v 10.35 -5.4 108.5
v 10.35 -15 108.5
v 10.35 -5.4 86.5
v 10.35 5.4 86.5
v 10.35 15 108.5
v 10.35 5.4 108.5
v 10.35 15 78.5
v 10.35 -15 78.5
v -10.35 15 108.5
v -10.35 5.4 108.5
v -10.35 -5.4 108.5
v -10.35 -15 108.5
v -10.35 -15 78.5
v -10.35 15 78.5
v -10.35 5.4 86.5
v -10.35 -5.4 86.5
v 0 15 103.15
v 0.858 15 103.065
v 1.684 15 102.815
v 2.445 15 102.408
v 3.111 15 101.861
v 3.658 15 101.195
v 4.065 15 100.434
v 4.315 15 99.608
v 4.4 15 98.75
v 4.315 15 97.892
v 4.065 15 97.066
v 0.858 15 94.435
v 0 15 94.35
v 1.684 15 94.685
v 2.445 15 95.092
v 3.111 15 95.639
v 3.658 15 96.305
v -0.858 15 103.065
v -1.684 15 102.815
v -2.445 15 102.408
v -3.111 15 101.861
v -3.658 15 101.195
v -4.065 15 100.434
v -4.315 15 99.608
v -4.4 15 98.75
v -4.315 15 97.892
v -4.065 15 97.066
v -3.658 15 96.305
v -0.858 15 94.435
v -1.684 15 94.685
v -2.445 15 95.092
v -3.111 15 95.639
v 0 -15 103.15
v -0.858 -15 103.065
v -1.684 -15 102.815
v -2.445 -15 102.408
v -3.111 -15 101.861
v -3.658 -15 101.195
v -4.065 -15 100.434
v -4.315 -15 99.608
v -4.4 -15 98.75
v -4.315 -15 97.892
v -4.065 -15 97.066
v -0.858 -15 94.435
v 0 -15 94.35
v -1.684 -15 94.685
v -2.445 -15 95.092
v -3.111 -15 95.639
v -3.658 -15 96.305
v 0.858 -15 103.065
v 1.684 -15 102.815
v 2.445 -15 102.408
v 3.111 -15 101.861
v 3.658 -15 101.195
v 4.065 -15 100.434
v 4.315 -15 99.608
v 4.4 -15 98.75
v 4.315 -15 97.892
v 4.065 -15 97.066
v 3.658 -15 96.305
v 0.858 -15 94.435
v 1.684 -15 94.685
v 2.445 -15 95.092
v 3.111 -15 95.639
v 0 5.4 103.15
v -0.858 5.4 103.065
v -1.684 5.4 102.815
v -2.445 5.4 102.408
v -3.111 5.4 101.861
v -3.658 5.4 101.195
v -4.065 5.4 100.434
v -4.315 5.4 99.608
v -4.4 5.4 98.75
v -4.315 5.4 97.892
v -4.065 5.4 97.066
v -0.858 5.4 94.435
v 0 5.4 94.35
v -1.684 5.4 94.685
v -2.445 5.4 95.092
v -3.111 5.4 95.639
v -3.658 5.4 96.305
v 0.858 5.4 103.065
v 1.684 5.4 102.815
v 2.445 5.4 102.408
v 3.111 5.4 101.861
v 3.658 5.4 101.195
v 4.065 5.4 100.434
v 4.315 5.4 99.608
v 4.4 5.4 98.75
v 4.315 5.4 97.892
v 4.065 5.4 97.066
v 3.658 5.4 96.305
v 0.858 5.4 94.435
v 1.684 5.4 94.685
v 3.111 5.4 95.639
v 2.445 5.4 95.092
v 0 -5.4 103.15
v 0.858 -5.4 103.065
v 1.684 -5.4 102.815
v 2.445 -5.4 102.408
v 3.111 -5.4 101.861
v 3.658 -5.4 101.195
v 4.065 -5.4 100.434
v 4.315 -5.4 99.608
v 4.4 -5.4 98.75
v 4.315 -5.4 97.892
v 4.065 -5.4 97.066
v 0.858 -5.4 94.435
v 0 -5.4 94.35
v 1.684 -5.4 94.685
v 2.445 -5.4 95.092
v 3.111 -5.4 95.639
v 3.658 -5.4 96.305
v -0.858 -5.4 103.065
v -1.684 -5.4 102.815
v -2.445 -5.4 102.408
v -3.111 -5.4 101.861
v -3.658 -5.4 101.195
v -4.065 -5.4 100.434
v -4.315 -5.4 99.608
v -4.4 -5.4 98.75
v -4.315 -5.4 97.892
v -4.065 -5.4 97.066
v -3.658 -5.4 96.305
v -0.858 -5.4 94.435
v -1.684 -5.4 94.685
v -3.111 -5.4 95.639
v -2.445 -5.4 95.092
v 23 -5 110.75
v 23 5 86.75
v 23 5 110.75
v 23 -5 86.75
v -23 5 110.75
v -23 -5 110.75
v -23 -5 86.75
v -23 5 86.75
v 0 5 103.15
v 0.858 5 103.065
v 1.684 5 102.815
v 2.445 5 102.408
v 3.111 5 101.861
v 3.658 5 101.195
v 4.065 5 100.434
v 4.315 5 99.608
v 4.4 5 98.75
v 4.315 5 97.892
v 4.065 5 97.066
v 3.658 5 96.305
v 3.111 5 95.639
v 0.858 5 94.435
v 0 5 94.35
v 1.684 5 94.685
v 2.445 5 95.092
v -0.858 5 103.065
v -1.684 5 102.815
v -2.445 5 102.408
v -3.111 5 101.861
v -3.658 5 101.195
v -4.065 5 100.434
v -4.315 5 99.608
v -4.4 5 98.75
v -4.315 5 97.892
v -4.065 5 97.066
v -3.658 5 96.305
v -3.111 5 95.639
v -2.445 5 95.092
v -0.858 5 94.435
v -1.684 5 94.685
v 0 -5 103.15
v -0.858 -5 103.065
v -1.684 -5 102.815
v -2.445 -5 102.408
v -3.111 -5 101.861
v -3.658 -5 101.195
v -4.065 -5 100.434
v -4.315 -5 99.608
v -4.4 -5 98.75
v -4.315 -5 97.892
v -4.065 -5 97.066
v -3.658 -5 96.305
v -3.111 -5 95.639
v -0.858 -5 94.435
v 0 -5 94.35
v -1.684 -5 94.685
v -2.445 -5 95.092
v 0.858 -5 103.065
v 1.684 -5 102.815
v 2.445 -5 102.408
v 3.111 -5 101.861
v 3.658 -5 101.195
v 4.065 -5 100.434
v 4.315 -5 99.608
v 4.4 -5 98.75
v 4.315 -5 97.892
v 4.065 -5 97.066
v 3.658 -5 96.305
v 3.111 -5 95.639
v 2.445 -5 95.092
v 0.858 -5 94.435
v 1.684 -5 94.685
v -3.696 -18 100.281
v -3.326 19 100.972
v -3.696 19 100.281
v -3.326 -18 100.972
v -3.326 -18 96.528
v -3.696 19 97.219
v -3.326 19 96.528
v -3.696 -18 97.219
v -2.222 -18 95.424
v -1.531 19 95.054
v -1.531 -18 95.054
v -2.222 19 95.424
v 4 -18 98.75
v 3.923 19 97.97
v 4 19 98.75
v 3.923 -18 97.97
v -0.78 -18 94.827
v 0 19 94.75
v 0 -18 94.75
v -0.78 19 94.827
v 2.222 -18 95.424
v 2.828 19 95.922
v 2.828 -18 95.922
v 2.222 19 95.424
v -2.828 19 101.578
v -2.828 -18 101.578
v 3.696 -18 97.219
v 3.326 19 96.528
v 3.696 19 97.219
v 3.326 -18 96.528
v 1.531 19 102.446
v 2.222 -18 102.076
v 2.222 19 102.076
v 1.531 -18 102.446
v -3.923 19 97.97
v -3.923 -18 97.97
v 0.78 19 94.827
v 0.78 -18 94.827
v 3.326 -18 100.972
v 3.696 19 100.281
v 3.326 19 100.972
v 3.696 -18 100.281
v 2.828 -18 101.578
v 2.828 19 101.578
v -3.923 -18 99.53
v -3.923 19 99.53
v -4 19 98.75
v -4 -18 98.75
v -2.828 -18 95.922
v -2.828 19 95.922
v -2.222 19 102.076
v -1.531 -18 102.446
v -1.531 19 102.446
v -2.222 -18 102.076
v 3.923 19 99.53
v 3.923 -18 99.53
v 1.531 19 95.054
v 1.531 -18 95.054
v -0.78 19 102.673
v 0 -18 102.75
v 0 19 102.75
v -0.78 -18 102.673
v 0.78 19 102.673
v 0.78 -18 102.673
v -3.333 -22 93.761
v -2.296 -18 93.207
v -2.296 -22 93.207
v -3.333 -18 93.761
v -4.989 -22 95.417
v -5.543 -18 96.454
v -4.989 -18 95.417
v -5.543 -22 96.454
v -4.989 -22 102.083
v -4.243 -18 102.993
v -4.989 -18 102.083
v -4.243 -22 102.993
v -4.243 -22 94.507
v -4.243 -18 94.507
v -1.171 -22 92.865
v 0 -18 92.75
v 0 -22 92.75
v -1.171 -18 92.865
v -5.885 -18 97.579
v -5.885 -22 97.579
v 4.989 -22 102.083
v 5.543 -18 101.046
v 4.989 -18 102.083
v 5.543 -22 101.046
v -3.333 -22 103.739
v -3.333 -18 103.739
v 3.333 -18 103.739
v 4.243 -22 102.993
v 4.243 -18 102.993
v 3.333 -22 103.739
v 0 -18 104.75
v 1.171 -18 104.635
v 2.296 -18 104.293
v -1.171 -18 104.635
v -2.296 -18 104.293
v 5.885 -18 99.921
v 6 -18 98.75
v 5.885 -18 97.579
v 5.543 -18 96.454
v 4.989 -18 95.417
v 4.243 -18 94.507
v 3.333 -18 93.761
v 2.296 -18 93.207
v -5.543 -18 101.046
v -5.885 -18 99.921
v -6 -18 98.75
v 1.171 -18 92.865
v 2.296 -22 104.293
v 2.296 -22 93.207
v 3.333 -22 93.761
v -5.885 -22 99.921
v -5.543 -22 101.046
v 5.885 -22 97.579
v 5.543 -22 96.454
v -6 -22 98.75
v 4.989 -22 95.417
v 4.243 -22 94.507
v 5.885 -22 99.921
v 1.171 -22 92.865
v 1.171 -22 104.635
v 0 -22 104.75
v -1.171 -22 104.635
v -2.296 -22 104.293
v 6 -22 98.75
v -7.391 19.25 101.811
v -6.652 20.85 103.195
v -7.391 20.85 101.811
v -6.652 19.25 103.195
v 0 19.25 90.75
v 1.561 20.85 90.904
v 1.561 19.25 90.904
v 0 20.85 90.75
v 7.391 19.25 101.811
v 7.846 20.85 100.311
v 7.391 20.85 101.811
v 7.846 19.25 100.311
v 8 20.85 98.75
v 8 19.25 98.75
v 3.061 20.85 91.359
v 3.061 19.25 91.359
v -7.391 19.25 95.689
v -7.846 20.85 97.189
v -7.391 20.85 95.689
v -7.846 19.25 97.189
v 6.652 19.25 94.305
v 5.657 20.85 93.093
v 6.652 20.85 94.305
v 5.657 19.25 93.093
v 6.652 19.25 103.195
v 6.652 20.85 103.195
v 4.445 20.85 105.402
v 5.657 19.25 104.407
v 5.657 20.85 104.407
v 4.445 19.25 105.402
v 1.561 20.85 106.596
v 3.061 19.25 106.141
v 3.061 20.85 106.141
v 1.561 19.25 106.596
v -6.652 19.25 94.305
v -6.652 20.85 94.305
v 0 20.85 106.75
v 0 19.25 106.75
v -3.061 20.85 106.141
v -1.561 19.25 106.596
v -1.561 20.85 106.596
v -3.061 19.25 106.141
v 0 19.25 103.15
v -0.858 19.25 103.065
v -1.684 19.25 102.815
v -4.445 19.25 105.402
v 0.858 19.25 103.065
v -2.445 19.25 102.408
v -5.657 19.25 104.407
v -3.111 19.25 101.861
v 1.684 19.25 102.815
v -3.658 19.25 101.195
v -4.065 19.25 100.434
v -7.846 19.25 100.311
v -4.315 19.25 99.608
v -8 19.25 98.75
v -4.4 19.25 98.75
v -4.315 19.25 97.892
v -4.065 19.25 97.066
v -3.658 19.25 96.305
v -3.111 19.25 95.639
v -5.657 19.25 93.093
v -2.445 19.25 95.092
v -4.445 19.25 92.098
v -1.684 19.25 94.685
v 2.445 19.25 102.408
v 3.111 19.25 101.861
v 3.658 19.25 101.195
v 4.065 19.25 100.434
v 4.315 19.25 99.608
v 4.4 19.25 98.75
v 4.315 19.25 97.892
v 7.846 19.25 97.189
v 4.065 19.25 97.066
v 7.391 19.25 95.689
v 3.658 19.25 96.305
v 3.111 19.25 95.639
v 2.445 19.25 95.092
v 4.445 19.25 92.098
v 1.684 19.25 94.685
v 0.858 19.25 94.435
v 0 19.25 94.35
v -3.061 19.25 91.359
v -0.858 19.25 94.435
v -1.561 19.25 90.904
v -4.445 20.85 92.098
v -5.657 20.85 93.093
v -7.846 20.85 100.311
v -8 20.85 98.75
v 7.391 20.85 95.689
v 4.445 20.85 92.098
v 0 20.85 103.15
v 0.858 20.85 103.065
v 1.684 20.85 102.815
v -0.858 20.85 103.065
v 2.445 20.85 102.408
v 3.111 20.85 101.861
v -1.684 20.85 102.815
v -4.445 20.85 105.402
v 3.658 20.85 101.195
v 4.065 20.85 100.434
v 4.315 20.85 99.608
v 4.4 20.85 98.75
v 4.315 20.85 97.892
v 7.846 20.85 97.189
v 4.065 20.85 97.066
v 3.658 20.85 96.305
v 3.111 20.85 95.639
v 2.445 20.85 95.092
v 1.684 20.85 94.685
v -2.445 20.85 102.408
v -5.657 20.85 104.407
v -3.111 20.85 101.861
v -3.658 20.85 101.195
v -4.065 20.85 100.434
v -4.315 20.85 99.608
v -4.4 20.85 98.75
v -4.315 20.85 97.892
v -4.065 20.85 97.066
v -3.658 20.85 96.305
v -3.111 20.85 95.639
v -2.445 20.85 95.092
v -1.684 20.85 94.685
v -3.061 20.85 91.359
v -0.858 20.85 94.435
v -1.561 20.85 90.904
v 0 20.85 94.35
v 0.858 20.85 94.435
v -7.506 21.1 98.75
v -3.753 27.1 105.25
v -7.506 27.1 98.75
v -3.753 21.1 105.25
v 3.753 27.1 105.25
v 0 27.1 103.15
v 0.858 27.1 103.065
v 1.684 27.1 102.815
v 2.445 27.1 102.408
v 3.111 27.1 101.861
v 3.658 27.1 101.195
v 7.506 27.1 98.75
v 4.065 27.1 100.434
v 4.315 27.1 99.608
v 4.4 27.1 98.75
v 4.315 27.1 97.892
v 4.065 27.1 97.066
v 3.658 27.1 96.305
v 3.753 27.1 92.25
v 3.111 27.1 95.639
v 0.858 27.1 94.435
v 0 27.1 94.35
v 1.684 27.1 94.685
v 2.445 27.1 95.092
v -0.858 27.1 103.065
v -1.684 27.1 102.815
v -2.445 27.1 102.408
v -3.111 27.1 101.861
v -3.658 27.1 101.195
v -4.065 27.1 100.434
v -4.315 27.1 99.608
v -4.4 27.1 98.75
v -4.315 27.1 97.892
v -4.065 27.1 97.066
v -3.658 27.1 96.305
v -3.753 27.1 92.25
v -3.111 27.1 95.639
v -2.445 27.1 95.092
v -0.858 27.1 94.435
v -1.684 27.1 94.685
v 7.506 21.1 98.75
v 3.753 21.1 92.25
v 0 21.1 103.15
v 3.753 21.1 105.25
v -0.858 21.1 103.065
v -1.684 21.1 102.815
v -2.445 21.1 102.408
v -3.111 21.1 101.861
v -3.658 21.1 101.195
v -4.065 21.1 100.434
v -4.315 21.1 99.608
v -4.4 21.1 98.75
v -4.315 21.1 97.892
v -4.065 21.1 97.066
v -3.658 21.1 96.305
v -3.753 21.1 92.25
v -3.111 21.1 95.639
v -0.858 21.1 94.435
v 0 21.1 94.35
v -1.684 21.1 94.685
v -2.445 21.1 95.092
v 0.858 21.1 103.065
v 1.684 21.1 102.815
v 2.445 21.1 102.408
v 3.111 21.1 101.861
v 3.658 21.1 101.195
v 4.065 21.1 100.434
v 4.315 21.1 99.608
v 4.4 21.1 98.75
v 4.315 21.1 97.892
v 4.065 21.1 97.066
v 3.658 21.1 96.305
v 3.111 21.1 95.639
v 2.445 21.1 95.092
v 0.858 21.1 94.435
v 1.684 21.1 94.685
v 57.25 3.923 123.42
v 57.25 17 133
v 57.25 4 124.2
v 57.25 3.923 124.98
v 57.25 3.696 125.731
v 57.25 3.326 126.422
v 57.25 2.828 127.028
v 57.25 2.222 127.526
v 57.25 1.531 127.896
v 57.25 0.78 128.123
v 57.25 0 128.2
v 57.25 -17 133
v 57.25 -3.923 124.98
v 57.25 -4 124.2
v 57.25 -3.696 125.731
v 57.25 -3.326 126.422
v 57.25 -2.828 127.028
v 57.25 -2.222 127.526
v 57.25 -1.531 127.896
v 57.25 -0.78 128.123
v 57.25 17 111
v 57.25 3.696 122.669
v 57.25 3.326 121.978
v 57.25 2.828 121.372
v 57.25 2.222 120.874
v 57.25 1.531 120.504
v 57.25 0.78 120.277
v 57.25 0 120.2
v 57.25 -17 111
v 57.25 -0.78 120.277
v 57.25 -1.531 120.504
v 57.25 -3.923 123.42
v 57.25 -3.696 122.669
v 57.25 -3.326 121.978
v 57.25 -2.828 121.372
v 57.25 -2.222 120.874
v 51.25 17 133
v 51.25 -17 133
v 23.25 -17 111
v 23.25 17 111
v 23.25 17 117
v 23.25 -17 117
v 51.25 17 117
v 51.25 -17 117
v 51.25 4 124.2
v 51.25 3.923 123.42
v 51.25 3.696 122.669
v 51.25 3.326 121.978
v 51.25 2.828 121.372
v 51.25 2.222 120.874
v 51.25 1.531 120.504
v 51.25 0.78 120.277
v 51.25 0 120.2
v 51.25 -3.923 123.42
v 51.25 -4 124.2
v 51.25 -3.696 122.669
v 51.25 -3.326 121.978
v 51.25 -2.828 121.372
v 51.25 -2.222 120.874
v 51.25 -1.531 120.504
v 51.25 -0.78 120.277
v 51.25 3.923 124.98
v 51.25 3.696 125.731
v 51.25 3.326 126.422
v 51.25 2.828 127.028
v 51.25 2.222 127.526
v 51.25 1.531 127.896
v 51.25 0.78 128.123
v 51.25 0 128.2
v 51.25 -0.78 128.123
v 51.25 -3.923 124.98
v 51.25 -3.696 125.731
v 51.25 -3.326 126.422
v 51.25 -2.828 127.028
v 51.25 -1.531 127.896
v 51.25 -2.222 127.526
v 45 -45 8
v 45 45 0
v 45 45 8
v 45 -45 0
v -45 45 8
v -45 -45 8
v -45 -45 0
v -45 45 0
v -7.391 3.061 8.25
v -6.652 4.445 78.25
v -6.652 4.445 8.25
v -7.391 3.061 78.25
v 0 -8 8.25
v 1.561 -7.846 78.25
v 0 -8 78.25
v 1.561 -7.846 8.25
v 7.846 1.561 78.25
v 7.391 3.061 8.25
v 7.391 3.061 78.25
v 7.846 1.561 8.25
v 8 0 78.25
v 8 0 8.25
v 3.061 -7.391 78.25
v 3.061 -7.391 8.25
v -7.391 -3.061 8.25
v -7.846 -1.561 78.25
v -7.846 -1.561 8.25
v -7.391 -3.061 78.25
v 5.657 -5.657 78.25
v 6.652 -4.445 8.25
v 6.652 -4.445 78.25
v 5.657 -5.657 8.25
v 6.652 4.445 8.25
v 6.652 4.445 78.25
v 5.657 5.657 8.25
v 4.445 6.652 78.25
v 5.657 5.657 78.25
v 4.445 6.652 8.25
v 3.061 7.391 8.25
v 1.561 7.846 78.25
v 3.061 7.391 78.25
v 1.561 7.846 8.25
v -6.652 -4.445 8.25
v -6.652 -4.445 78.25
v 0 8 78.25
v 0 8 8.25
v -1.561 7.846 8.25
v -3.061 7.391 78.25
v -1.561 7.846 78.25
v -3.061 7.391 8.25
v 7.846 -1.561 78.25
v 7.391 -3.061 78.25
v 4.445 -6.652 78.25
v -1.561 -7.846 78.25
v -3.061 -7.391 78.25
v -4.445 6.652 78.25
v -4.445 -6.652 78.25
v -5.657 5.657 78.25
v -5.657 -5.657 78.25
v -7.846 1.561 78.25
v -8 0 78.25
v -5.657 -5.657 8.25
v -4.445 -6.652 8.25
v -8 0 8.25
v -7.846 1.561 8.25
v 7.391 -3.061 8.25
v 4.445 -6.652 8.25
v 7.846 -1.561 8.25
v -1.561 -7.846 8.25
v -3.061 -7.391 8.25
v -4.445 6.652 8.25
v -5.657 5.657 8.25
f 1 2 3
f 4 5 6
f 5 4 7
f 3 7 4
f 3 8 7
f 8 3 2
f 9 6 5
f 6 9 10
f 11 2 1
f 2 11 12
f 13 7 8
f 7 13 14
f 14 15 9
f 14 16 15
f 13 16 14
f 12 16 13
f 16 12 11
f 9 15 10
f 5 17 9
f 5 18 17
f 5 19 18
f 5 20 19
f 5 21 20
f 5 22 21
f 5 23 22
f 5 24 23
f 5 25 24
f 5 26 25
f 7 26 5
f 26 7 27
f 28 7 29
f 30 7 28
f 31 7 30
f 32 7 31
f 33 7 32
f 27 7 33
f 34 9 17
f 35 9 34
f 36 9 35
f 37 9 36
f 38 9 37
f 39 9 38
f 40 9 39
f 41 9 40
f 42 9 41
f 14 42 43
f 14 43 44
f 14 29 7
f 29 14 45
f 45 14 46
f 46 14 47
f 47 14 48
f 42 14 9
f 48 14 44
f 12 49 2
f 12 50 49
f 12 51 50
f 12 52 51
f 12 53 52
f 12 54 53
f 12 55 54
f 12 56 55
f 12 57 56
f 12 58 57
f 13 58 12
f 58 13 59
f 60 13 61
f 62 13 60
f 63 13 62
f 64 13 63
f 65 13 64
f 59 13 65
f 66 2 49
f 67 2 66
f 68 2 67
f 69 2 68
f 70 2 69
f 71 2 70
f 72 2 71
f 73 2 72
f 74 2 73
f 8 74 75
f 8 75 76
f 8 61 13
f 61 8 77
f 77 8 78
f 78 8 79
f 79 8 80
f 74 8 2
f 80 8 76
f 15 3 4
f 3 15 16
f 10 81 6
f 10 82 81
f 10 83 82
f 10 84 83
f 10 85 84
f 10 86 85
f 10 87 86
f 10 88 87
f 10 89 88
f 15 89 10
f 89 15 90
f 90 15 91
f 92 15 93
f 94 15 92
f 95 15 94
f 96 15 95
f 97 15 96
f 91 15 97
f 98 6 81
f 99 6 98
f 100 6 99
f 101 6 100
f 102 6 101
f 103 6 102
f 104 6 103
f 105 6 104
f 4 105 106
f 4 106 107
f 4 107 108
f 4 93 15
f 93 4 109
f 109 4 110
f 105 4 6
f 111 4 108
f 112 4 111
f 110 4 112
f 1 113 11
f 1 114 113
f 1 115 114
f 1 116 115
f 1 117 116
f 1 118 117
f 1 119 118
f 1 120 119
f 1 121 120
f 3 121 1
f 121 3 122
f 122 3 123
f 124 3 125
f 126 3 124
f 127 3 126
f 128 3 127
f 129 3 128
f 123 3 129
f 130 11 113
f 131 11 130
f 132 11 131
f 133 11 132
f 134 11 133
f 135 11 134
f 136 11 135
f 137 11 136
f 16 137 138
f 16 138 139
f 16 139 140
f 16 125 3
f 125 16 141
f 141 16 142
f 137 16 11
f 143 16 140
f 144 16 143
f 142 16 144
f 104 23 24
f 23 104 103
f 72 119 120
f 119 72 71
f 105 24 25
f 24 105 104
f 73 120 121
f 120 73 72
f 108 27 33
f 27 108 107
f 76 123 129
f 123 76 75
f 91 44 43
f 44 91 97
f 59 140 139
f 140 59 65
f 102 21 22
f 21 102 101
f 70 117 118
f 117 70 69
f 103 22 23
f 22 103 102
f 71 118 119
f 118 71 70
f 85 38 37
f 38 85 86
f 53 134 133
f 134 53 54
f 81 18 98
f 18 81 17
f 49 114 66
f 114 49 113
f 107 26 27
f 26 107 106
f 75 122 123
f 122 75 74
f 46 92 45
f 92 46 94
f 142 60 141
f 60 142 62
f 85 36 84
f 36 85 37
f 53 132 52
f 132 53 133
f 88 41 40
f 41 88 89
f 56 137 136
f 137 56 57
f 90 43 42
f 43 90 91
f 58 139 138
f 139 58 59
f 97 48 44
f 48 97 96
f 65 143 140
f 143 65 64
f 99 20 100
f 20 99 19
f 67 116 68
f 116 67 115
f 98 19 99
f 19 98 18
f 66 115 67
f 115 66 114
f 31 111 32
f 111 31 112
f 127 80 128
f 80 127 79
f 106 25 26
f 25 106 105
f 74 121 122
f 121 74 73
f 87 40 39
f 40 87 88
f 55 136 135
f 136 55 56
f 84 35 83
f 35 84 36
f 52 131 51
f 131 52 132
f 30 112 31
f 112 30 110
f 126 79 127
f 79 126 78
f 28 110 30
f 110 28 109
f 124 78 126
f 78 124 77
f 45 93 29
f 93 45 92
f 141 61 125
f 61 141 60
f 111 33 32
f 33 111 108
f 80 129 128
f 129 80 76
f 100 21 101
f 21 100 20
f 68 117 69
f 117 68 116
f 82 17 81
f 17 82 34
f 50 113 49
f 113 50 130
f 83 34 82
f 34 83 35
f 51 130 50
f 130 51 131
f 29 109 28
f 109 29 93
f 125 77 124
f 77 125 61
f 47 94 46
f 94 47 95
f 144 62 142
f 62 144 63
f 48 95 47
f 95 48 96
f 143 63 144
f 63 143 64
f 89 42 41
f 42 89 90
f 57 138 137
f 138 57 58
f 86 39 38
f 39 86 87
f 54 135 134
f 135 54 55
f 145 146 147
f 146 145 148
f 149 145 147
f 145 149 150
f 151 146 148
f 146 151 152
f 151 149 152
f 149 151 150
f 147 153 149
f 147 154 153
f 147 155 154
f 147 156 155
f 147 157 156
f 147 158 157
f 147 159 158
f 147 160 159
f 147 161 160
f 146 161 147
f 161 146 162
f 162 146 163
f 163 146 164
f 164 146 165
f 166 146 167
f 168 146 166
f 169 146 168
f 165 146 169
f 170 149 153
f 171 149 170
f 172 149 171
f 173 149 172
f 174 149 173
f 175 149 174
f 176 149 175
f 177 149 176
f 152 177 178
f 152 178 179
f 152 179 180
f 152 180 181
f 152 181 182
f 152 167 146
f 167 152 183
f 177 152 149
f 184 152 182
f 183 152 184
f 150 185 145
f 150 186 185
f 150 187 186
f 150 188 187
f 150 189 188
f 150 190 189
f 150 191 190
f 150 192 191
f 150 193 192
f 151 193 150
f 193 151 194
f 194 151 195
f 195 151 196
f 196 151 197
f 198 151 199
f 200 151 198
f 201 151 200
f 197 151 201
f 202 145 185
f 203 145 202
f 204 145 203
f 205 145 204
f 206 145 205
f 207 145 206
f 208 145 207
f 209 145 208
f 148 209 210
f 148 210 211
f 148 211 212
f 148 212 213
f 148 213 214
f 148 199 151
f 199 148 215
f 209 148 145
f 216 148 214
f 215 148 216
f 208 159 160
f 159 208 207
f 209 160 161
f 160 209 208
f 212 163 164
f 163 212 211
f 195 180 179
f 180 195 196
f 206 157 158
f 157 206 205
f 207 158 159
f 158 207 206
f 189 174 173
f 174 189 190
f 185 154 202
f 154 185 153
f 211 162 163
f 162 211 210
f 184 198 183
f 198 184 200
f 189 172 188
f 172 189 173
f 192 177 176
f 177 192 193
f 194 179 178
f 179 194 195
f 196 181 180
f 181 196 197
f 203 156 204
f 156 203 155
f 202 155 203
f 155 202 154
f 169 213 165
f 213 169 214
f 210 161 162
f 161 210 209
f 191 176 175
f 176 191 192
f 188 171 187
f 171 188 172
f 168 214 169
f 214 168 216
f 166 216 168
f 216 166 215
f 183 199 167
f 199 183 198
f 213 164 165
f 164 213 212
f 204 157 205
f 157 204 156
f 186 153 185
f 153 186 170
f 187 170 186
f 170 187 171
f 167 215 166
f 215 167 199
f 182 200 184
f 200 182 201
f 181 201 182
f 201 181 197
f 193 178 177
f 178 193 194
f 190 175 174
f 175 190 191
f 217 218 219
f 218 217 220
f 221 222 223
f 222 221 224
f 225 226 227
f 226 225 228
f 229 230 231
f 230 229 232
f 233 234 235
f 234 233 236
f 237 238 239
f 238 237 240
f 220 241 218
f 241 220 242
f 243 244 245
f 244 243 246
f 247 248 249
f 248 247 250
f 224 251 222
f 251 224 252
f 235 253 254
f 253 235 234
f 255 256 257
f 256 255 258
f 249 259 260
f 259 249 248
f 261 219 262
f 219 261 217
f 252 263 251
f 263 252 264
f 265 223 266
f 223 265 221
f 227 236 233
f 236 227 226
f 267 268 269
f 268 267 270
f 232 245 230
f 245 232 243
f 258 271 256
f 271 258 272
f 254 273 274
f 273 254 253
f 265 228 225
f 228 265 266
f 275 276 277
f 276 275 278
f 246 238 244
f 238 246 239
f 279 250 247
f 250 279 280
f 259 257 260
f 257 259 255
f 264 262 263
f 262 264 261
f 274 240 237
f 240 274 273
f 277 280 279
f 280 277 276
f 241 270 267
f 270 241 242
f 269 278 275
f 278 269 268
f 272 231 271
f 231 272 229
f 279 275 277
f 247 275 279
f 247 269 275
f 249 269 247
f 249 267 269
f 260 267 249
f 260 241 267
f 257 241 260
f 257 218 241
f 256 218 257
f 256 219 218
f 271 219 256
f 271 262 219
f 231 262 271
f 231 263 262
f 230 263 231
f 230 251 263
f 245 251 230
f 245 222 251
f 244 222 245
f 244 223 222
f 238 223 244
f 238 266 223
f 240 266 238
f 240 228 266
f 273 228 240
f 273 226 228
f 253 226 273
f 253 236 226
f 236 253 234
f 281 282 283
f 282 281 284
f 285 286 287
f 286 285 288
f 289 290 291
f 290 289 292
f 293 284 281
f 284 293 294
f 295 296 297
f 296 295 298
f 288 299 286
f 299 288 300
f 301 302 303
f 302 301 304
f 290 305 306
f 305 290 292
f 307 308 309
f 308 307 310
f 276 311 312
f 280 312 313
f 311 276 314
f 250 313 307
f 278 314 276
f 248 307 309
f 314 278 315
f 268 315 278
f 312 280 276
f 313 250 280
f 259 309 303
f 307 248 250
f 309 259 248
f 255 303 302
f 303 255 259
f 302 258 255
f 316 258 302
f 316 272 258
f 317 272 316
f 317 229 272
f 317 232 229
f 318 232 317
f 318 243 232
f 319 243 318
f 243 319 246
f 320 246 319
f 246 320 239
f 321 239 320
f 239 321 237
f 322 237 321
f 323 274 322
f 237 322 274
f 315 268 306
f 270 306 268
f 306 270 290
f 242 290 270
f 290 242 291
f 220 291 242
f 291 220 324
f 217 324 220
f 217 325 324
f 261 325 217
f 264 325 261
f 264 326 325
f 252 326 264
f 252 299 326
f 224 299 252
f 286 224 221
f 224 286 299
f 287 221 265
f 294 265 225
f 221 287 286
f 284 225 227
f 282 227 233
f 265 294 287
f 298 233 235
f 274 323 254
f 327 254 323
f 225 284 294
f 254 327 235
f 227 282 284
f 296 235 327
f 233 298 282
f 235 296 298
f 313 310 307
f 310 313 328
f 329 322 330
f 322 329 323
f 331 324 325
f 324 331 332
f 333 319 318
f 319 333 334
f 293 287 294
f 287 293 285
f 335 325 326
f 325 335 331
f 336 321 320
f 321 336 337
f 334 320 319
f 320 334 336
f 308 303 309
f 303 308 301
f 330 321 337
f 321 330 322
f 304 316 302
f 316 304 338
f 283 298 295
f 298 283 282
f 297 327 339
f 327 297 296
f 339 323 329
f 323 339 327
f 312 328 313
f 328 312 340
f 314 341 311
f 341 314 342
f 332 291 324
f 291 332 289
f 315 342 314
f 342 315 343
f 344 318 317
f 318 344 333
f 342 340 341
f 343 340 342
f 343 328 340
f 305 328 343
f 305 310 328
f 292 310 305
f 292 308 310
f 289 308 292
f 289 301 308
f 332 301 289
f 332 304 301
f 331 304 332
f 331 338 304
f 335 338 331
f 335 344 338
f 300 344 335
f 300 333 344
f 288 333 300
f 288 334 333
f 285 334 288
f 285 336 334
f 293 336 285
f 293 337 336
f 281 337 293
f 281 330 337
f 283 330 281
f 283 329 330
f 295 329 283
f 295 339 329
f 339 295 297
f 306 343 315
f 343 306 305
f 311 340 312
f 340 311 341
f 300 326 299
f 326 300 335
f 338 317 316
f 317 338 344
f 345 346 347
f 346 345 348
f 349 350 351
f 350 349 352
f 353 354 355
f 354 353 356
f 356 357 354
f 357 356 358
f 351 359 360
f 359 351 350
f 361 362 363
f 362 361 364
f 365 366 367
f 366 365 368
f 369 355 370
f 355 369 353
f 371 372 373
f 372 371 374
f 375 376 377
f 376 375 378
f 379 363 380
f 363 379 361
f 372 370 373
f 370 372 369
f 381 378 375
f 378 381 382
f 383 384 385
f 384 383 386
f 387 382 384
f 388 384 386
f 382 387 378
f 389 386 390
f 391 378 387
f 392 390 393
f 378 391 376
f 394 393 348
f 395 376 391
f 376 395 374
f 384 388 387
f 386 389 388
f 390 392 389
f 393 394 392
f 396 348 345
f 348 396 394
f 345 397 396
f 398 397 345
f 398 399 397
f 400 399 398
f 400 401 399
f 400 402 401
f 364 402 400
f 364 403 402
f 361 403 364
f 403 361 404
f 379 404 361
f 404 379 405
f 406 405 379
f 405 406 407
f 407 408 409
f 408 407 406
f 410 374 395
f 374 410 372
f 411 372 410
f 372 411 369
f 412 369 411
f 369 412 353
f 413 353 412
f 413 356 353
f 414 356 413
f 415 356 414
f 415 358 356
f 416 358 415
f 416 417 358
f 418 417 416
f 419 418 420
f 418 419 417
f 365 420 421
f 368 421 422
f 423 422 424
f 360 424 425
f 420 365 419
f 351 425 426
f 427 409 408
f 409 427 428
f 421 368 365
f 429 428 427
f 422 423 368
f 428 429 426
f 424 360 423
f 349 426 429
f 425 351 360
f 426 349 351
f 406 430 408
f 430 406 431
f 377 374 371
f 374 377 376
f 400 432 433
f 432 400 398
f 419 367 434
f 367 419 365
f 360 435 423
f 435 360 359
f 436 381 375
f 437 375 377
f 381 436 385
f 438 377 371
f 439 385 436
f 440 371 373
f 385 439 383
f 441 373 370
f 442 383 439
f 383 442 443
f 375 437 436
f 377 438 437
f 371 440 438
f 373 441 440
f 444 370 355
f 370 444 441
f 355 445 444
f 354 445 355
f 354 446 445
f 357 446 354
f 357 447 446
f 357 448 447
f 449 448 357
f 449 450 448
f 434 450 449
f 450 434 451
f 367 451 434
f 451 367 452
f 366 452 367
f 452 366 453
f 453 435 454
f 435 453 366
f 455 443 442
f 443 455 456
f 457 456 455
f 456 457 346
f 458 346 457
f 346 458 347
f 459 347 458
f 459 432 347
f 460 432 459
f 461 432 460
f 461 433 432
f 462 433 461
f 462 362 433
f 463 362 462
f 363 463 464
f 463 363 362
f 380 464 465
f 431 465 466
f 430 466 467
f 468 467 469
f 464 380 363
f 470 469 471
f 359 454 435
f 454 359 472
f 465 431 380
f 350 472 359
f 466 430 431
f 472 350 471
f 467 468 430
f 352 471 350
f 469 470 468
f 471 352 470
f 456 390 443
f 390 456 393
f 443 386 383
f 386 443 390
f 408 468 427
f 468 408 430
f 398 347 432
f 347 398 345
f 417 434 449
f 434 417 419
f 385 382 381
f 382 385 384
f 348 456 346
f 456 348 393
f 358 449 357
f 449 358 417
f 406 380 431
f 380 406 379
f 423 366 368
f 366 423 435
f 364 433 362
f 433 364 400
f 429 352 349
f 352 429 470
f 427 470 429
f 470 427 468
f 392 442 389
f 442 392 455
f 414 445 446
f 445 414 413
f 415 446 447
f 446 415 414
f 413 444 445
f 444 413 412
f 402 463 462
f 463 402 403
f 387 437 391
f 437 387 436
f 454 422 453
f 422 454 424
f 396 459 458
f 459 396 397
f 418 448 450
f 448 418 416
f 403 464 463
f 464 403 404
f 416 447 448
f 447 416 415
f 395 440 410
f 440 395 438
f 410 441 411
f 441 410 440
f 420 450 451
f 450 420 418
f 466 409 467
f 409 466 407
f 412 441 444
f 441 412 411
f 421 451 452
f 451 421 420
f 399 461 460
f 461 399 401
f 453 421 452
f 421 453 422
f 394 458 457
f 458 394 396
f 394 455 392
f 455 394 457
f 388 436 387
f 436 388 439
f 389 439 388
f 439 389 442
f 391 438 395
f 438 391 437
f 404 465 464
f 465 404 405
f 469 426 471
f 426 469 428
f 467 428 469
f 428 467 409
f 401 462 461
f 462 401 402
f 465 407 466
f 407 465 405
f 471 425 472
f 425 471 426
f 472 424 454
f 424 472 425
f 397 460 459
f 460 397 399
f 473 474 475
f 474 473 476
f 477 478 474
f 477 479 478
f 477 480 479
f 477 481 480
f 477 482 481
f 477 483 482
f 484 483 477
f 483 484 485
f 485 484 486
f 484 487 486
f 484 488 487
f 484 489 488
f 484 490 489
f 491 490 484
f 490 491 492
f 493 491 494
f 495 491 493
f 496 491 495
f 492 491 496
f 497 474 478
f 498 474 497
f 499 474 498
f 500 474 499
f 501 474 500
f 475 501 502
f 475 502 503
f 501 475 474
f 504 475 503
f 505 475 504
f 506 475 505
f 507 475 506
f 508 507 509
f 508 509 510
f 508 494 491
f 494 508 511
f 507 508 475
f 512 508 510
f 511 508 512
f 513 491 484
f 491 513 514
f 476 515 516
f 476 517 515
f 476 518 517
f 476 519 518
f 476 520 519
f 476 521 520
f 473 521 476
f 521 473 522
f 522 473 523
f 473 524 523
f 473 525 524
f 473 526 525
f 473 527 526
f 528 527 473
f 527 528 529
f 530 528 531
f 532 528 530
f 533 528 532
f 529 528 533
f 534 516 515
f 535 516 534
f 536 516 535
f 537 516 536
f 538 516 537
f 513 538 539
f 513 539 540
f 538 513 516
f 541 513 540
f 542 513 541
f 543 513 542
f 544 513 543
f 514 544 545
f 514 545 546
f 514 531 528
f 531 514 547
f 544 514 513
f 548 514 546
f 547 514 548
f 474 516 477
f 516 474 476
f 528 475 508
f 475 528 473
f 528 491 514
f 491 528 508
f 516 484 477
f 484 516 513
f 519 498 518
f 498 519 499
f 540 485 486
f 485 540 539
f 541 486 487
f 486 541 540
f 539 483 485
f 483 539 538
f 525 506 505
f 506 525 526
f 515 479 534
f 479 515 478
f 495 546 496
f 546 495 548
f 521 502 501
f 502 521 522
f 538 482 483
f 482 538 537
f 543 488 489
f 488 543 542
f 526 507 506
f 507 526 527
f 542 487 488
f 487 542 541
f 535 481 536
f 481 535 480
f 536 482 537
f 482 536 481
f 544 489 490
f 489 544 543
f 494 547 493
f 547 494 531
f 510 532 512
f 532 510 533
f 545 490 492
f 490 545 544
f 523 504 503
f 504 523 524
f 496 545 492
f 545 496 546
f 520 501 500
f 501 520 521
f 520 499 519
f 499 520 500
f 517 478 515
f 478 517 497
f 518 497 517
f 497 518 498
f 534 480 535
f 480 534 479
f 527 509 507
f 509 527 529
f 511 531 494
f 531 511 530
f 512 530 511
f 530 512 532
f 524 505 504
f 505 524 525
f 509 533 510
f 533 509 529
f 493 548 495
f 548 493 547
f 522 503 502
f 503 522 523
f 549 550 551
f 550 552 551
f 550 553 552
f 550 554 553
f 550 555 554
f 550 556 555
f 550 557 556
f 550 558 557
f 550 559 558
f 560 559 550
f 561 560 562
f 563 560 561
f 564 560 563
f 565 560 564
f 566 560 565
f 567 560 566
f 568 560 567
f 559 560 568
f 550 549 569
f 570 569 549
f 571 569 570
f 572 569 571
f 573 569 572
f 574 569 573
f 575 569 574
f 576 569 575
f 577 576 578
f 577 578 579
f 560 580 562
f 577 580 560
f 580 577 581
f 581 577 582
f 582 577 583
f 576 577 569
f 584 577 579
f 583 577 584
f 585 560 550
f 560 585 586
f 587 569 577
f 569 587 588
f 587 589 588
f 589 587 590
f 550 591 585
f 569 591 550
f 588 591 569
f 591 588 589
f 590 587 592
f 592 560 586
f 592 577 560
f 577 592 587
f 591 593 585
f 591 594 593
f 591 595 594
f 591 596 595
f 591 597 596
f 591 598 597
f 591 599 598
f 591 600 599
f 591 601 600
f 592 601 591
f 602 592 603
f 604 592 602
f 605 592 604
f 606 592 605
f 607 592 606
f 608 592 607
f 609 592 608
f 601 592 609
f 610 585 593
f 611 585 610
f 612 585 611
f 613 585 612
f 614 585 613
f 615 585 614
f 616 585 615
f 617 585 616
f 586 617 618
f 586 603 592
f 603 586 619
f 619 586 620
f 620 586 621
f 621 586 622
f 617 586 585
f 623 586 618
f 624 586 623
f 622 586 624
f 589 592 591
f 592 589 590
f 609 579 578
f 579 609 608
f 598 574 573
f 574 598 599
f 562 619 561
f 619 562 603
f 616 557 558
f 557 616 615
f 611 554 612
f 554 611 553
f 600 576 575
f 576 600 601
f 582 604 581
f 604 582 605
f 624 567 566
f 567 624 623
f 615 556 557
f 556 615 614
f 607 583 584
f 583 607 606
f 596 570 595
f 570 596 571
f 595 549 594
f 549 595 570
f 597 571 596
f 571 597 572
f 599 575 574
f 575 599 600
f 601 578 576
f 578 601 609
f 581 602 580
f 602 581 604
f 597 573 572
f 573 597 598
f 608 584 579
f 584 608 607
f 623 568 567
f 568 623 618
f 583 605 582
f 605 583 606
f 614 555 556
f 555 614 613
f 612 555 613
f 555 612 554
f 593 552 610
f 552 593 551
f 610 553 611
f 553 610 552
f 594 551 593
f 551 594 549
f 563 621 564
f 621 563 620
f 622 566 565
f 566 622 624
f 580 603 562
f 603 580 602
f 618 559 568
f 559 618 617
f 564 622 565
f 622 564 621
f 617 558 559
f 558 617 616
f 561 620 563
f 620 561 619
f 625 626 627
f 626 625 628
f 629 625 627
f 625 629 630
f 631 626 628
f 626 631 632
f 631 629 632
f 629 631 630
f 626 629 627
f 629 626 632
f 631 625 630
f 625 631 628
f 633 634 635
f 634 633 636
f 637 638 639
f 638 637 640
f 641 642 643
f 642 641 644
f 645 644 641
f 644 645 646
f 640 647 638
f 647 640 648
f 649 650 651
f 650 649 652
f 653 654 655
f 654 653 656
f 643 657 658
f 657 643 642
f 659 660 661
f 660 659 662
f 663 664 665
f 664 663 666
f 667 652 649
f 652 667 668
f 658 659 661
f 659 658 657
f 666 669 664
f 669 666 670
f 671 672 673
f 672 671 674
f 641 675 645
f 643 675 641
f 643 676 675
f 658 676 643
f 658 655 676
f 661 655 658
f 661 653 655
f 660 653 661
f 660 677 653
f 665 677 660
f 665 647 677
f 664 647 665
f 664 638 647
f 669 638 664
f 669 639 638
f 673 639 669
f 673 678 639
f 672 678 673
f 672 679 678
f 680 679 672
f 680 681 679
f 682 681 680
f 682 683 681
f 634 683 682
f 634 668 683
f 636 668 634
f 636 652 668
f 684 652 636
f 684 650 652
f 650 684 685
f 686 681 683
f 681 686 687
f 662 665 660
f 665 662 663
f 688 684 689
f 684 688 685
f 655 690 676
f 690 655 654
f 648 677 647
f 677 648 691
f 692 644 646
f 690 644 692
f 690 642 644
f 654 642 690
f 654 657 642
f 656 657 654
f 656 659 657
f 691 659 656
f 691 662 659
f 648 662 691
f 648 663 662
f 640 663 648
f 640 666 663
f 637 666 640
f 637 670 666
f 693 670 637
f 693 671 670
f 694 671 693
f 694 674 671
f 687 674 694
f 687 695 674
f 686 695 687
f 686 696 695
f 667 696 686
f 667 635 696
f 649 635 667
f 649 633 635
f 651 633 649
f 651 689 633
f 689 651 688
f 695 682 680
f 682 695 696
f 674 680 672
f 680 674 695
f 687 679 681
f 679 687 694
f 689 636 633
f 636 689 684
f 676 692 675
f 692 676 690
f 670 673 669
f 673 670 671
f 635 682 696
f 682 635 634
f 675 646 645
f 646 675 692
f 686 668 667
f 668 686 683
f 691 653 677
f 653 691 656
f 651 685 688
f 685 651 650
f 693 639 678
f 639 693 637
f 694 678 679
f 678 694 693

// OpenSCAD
$fn = 32;

// ------------------------------------------------------------------------
// Lamp arm: column d16 x 70 mm, arm 46 mm
// Every part is its own module, assembly() places every instance.
// ------------------------------------------------------------------------

// --- part 1 ---
module lamp_base() {
  difference() {
    translate([-45, -45, 0]) cube([90, 90, 8]);
  }
}

// --- part 2 ---
module lamp_column() {
  cylinder(h = 70, d = 16);
}

// --- part 3 ---
module head_fork() {
  difference() {
    translate([-10.35, -15, 0]) cube([20.7, 30, 30]);
    translate([-11.35, -5.4, 8]) cube([22.7, 10.8, 23]);
    translate([0, 0, 20.25]) rotate([90, 0, 0]) cylinder(h = 32, d = 8.8, center = true);
  }
}

// --- part 4 ---
module lamp_arm() {
  difference() {
    translate([-23, -5, 0]) cube([46, 10, 24]);
    translate([0, 0, 12]) rotate([90, 0, 0]) cylinder(h = 12, d = 8.8, center = true);
  }
}

// --- part 5 ---
module arm_pin() {
  rotate([0, 90, 0]) cylinder(h = 38, d = 8, center = true);
  translate([-22, 0, 0]) rotate([0, 90, 0]) cylinder(h = 4, d = 12);
}

// --- part 6 ---
module arm_washer() {
  difference() {
      translate([0, 0, 0]) cylinder(h = 1.6, d = 16);
      translate([0, 0, -1]) cylinder(h = 3.6, d = 8.8);
    }
}

// --- part 7 ---
module arm_nut() {
  difference() {
    linear_extrude(height = 6) polygon(points = [[7.506, 0], [3.753, 6.5], [-3.753, 6.5], [-7.506, 0], [-3.753, -6.5], [3.753, -6.5]]);
    translate([0, 0, -1]) cylinder(h = 8, d = 8.8);
  }
}

// --- part 8 ---
module shade_bracket() {
  difference() {
    translate([-17, -17, 0]) cube([34, 34, 22]);
    translate([-18, -18, 6]) cube([29, 36, 17]);
    translate([14, 0, 13.2]) rotate([0, 90, 0]) cylinder(h = 8, d = 8, center = true);
  }
}

// --- assembly ---
module assembly() {
  color([0.80, 0.24, 0.20]) translate([0, 0, 0]) rotate([0, 0, 0]) lamp_base();
  color([0.20, 0.45, 0.75]) translate([0, 0, 8.25]) rotate([0, 0, 0]) lamp_column();
  color([0.25, 0.62, 0.32]) translate([0, 0, 78.5]) rotate([0, 0, 0]) head_fork();
  color([0.92, 0.70, 0.18]) translate([0, 0, 86.75]) rotate([0, 0, 0]) lamp_arm();
  color([0.58, 0.35, 0.70]) translate([0, 0, 98.75]) rotate([0, 0, 90]) arm_pin();
  color([0.16, 0.66, 0.66]) translate([0, 20.85, 98.75]) rotate([90, 0, 0]) arm_washer();
  color([0.85, 0.48, 0.18]) translate([0, 27.1, 98.75]) rotate([90, 0, 0]) arm_nut();
  color([0.55, 0.60, 0.65]) translate([40.25, 0, 111]) rotate([0, 0, 0]) shade_bracket();
}

assembly();
